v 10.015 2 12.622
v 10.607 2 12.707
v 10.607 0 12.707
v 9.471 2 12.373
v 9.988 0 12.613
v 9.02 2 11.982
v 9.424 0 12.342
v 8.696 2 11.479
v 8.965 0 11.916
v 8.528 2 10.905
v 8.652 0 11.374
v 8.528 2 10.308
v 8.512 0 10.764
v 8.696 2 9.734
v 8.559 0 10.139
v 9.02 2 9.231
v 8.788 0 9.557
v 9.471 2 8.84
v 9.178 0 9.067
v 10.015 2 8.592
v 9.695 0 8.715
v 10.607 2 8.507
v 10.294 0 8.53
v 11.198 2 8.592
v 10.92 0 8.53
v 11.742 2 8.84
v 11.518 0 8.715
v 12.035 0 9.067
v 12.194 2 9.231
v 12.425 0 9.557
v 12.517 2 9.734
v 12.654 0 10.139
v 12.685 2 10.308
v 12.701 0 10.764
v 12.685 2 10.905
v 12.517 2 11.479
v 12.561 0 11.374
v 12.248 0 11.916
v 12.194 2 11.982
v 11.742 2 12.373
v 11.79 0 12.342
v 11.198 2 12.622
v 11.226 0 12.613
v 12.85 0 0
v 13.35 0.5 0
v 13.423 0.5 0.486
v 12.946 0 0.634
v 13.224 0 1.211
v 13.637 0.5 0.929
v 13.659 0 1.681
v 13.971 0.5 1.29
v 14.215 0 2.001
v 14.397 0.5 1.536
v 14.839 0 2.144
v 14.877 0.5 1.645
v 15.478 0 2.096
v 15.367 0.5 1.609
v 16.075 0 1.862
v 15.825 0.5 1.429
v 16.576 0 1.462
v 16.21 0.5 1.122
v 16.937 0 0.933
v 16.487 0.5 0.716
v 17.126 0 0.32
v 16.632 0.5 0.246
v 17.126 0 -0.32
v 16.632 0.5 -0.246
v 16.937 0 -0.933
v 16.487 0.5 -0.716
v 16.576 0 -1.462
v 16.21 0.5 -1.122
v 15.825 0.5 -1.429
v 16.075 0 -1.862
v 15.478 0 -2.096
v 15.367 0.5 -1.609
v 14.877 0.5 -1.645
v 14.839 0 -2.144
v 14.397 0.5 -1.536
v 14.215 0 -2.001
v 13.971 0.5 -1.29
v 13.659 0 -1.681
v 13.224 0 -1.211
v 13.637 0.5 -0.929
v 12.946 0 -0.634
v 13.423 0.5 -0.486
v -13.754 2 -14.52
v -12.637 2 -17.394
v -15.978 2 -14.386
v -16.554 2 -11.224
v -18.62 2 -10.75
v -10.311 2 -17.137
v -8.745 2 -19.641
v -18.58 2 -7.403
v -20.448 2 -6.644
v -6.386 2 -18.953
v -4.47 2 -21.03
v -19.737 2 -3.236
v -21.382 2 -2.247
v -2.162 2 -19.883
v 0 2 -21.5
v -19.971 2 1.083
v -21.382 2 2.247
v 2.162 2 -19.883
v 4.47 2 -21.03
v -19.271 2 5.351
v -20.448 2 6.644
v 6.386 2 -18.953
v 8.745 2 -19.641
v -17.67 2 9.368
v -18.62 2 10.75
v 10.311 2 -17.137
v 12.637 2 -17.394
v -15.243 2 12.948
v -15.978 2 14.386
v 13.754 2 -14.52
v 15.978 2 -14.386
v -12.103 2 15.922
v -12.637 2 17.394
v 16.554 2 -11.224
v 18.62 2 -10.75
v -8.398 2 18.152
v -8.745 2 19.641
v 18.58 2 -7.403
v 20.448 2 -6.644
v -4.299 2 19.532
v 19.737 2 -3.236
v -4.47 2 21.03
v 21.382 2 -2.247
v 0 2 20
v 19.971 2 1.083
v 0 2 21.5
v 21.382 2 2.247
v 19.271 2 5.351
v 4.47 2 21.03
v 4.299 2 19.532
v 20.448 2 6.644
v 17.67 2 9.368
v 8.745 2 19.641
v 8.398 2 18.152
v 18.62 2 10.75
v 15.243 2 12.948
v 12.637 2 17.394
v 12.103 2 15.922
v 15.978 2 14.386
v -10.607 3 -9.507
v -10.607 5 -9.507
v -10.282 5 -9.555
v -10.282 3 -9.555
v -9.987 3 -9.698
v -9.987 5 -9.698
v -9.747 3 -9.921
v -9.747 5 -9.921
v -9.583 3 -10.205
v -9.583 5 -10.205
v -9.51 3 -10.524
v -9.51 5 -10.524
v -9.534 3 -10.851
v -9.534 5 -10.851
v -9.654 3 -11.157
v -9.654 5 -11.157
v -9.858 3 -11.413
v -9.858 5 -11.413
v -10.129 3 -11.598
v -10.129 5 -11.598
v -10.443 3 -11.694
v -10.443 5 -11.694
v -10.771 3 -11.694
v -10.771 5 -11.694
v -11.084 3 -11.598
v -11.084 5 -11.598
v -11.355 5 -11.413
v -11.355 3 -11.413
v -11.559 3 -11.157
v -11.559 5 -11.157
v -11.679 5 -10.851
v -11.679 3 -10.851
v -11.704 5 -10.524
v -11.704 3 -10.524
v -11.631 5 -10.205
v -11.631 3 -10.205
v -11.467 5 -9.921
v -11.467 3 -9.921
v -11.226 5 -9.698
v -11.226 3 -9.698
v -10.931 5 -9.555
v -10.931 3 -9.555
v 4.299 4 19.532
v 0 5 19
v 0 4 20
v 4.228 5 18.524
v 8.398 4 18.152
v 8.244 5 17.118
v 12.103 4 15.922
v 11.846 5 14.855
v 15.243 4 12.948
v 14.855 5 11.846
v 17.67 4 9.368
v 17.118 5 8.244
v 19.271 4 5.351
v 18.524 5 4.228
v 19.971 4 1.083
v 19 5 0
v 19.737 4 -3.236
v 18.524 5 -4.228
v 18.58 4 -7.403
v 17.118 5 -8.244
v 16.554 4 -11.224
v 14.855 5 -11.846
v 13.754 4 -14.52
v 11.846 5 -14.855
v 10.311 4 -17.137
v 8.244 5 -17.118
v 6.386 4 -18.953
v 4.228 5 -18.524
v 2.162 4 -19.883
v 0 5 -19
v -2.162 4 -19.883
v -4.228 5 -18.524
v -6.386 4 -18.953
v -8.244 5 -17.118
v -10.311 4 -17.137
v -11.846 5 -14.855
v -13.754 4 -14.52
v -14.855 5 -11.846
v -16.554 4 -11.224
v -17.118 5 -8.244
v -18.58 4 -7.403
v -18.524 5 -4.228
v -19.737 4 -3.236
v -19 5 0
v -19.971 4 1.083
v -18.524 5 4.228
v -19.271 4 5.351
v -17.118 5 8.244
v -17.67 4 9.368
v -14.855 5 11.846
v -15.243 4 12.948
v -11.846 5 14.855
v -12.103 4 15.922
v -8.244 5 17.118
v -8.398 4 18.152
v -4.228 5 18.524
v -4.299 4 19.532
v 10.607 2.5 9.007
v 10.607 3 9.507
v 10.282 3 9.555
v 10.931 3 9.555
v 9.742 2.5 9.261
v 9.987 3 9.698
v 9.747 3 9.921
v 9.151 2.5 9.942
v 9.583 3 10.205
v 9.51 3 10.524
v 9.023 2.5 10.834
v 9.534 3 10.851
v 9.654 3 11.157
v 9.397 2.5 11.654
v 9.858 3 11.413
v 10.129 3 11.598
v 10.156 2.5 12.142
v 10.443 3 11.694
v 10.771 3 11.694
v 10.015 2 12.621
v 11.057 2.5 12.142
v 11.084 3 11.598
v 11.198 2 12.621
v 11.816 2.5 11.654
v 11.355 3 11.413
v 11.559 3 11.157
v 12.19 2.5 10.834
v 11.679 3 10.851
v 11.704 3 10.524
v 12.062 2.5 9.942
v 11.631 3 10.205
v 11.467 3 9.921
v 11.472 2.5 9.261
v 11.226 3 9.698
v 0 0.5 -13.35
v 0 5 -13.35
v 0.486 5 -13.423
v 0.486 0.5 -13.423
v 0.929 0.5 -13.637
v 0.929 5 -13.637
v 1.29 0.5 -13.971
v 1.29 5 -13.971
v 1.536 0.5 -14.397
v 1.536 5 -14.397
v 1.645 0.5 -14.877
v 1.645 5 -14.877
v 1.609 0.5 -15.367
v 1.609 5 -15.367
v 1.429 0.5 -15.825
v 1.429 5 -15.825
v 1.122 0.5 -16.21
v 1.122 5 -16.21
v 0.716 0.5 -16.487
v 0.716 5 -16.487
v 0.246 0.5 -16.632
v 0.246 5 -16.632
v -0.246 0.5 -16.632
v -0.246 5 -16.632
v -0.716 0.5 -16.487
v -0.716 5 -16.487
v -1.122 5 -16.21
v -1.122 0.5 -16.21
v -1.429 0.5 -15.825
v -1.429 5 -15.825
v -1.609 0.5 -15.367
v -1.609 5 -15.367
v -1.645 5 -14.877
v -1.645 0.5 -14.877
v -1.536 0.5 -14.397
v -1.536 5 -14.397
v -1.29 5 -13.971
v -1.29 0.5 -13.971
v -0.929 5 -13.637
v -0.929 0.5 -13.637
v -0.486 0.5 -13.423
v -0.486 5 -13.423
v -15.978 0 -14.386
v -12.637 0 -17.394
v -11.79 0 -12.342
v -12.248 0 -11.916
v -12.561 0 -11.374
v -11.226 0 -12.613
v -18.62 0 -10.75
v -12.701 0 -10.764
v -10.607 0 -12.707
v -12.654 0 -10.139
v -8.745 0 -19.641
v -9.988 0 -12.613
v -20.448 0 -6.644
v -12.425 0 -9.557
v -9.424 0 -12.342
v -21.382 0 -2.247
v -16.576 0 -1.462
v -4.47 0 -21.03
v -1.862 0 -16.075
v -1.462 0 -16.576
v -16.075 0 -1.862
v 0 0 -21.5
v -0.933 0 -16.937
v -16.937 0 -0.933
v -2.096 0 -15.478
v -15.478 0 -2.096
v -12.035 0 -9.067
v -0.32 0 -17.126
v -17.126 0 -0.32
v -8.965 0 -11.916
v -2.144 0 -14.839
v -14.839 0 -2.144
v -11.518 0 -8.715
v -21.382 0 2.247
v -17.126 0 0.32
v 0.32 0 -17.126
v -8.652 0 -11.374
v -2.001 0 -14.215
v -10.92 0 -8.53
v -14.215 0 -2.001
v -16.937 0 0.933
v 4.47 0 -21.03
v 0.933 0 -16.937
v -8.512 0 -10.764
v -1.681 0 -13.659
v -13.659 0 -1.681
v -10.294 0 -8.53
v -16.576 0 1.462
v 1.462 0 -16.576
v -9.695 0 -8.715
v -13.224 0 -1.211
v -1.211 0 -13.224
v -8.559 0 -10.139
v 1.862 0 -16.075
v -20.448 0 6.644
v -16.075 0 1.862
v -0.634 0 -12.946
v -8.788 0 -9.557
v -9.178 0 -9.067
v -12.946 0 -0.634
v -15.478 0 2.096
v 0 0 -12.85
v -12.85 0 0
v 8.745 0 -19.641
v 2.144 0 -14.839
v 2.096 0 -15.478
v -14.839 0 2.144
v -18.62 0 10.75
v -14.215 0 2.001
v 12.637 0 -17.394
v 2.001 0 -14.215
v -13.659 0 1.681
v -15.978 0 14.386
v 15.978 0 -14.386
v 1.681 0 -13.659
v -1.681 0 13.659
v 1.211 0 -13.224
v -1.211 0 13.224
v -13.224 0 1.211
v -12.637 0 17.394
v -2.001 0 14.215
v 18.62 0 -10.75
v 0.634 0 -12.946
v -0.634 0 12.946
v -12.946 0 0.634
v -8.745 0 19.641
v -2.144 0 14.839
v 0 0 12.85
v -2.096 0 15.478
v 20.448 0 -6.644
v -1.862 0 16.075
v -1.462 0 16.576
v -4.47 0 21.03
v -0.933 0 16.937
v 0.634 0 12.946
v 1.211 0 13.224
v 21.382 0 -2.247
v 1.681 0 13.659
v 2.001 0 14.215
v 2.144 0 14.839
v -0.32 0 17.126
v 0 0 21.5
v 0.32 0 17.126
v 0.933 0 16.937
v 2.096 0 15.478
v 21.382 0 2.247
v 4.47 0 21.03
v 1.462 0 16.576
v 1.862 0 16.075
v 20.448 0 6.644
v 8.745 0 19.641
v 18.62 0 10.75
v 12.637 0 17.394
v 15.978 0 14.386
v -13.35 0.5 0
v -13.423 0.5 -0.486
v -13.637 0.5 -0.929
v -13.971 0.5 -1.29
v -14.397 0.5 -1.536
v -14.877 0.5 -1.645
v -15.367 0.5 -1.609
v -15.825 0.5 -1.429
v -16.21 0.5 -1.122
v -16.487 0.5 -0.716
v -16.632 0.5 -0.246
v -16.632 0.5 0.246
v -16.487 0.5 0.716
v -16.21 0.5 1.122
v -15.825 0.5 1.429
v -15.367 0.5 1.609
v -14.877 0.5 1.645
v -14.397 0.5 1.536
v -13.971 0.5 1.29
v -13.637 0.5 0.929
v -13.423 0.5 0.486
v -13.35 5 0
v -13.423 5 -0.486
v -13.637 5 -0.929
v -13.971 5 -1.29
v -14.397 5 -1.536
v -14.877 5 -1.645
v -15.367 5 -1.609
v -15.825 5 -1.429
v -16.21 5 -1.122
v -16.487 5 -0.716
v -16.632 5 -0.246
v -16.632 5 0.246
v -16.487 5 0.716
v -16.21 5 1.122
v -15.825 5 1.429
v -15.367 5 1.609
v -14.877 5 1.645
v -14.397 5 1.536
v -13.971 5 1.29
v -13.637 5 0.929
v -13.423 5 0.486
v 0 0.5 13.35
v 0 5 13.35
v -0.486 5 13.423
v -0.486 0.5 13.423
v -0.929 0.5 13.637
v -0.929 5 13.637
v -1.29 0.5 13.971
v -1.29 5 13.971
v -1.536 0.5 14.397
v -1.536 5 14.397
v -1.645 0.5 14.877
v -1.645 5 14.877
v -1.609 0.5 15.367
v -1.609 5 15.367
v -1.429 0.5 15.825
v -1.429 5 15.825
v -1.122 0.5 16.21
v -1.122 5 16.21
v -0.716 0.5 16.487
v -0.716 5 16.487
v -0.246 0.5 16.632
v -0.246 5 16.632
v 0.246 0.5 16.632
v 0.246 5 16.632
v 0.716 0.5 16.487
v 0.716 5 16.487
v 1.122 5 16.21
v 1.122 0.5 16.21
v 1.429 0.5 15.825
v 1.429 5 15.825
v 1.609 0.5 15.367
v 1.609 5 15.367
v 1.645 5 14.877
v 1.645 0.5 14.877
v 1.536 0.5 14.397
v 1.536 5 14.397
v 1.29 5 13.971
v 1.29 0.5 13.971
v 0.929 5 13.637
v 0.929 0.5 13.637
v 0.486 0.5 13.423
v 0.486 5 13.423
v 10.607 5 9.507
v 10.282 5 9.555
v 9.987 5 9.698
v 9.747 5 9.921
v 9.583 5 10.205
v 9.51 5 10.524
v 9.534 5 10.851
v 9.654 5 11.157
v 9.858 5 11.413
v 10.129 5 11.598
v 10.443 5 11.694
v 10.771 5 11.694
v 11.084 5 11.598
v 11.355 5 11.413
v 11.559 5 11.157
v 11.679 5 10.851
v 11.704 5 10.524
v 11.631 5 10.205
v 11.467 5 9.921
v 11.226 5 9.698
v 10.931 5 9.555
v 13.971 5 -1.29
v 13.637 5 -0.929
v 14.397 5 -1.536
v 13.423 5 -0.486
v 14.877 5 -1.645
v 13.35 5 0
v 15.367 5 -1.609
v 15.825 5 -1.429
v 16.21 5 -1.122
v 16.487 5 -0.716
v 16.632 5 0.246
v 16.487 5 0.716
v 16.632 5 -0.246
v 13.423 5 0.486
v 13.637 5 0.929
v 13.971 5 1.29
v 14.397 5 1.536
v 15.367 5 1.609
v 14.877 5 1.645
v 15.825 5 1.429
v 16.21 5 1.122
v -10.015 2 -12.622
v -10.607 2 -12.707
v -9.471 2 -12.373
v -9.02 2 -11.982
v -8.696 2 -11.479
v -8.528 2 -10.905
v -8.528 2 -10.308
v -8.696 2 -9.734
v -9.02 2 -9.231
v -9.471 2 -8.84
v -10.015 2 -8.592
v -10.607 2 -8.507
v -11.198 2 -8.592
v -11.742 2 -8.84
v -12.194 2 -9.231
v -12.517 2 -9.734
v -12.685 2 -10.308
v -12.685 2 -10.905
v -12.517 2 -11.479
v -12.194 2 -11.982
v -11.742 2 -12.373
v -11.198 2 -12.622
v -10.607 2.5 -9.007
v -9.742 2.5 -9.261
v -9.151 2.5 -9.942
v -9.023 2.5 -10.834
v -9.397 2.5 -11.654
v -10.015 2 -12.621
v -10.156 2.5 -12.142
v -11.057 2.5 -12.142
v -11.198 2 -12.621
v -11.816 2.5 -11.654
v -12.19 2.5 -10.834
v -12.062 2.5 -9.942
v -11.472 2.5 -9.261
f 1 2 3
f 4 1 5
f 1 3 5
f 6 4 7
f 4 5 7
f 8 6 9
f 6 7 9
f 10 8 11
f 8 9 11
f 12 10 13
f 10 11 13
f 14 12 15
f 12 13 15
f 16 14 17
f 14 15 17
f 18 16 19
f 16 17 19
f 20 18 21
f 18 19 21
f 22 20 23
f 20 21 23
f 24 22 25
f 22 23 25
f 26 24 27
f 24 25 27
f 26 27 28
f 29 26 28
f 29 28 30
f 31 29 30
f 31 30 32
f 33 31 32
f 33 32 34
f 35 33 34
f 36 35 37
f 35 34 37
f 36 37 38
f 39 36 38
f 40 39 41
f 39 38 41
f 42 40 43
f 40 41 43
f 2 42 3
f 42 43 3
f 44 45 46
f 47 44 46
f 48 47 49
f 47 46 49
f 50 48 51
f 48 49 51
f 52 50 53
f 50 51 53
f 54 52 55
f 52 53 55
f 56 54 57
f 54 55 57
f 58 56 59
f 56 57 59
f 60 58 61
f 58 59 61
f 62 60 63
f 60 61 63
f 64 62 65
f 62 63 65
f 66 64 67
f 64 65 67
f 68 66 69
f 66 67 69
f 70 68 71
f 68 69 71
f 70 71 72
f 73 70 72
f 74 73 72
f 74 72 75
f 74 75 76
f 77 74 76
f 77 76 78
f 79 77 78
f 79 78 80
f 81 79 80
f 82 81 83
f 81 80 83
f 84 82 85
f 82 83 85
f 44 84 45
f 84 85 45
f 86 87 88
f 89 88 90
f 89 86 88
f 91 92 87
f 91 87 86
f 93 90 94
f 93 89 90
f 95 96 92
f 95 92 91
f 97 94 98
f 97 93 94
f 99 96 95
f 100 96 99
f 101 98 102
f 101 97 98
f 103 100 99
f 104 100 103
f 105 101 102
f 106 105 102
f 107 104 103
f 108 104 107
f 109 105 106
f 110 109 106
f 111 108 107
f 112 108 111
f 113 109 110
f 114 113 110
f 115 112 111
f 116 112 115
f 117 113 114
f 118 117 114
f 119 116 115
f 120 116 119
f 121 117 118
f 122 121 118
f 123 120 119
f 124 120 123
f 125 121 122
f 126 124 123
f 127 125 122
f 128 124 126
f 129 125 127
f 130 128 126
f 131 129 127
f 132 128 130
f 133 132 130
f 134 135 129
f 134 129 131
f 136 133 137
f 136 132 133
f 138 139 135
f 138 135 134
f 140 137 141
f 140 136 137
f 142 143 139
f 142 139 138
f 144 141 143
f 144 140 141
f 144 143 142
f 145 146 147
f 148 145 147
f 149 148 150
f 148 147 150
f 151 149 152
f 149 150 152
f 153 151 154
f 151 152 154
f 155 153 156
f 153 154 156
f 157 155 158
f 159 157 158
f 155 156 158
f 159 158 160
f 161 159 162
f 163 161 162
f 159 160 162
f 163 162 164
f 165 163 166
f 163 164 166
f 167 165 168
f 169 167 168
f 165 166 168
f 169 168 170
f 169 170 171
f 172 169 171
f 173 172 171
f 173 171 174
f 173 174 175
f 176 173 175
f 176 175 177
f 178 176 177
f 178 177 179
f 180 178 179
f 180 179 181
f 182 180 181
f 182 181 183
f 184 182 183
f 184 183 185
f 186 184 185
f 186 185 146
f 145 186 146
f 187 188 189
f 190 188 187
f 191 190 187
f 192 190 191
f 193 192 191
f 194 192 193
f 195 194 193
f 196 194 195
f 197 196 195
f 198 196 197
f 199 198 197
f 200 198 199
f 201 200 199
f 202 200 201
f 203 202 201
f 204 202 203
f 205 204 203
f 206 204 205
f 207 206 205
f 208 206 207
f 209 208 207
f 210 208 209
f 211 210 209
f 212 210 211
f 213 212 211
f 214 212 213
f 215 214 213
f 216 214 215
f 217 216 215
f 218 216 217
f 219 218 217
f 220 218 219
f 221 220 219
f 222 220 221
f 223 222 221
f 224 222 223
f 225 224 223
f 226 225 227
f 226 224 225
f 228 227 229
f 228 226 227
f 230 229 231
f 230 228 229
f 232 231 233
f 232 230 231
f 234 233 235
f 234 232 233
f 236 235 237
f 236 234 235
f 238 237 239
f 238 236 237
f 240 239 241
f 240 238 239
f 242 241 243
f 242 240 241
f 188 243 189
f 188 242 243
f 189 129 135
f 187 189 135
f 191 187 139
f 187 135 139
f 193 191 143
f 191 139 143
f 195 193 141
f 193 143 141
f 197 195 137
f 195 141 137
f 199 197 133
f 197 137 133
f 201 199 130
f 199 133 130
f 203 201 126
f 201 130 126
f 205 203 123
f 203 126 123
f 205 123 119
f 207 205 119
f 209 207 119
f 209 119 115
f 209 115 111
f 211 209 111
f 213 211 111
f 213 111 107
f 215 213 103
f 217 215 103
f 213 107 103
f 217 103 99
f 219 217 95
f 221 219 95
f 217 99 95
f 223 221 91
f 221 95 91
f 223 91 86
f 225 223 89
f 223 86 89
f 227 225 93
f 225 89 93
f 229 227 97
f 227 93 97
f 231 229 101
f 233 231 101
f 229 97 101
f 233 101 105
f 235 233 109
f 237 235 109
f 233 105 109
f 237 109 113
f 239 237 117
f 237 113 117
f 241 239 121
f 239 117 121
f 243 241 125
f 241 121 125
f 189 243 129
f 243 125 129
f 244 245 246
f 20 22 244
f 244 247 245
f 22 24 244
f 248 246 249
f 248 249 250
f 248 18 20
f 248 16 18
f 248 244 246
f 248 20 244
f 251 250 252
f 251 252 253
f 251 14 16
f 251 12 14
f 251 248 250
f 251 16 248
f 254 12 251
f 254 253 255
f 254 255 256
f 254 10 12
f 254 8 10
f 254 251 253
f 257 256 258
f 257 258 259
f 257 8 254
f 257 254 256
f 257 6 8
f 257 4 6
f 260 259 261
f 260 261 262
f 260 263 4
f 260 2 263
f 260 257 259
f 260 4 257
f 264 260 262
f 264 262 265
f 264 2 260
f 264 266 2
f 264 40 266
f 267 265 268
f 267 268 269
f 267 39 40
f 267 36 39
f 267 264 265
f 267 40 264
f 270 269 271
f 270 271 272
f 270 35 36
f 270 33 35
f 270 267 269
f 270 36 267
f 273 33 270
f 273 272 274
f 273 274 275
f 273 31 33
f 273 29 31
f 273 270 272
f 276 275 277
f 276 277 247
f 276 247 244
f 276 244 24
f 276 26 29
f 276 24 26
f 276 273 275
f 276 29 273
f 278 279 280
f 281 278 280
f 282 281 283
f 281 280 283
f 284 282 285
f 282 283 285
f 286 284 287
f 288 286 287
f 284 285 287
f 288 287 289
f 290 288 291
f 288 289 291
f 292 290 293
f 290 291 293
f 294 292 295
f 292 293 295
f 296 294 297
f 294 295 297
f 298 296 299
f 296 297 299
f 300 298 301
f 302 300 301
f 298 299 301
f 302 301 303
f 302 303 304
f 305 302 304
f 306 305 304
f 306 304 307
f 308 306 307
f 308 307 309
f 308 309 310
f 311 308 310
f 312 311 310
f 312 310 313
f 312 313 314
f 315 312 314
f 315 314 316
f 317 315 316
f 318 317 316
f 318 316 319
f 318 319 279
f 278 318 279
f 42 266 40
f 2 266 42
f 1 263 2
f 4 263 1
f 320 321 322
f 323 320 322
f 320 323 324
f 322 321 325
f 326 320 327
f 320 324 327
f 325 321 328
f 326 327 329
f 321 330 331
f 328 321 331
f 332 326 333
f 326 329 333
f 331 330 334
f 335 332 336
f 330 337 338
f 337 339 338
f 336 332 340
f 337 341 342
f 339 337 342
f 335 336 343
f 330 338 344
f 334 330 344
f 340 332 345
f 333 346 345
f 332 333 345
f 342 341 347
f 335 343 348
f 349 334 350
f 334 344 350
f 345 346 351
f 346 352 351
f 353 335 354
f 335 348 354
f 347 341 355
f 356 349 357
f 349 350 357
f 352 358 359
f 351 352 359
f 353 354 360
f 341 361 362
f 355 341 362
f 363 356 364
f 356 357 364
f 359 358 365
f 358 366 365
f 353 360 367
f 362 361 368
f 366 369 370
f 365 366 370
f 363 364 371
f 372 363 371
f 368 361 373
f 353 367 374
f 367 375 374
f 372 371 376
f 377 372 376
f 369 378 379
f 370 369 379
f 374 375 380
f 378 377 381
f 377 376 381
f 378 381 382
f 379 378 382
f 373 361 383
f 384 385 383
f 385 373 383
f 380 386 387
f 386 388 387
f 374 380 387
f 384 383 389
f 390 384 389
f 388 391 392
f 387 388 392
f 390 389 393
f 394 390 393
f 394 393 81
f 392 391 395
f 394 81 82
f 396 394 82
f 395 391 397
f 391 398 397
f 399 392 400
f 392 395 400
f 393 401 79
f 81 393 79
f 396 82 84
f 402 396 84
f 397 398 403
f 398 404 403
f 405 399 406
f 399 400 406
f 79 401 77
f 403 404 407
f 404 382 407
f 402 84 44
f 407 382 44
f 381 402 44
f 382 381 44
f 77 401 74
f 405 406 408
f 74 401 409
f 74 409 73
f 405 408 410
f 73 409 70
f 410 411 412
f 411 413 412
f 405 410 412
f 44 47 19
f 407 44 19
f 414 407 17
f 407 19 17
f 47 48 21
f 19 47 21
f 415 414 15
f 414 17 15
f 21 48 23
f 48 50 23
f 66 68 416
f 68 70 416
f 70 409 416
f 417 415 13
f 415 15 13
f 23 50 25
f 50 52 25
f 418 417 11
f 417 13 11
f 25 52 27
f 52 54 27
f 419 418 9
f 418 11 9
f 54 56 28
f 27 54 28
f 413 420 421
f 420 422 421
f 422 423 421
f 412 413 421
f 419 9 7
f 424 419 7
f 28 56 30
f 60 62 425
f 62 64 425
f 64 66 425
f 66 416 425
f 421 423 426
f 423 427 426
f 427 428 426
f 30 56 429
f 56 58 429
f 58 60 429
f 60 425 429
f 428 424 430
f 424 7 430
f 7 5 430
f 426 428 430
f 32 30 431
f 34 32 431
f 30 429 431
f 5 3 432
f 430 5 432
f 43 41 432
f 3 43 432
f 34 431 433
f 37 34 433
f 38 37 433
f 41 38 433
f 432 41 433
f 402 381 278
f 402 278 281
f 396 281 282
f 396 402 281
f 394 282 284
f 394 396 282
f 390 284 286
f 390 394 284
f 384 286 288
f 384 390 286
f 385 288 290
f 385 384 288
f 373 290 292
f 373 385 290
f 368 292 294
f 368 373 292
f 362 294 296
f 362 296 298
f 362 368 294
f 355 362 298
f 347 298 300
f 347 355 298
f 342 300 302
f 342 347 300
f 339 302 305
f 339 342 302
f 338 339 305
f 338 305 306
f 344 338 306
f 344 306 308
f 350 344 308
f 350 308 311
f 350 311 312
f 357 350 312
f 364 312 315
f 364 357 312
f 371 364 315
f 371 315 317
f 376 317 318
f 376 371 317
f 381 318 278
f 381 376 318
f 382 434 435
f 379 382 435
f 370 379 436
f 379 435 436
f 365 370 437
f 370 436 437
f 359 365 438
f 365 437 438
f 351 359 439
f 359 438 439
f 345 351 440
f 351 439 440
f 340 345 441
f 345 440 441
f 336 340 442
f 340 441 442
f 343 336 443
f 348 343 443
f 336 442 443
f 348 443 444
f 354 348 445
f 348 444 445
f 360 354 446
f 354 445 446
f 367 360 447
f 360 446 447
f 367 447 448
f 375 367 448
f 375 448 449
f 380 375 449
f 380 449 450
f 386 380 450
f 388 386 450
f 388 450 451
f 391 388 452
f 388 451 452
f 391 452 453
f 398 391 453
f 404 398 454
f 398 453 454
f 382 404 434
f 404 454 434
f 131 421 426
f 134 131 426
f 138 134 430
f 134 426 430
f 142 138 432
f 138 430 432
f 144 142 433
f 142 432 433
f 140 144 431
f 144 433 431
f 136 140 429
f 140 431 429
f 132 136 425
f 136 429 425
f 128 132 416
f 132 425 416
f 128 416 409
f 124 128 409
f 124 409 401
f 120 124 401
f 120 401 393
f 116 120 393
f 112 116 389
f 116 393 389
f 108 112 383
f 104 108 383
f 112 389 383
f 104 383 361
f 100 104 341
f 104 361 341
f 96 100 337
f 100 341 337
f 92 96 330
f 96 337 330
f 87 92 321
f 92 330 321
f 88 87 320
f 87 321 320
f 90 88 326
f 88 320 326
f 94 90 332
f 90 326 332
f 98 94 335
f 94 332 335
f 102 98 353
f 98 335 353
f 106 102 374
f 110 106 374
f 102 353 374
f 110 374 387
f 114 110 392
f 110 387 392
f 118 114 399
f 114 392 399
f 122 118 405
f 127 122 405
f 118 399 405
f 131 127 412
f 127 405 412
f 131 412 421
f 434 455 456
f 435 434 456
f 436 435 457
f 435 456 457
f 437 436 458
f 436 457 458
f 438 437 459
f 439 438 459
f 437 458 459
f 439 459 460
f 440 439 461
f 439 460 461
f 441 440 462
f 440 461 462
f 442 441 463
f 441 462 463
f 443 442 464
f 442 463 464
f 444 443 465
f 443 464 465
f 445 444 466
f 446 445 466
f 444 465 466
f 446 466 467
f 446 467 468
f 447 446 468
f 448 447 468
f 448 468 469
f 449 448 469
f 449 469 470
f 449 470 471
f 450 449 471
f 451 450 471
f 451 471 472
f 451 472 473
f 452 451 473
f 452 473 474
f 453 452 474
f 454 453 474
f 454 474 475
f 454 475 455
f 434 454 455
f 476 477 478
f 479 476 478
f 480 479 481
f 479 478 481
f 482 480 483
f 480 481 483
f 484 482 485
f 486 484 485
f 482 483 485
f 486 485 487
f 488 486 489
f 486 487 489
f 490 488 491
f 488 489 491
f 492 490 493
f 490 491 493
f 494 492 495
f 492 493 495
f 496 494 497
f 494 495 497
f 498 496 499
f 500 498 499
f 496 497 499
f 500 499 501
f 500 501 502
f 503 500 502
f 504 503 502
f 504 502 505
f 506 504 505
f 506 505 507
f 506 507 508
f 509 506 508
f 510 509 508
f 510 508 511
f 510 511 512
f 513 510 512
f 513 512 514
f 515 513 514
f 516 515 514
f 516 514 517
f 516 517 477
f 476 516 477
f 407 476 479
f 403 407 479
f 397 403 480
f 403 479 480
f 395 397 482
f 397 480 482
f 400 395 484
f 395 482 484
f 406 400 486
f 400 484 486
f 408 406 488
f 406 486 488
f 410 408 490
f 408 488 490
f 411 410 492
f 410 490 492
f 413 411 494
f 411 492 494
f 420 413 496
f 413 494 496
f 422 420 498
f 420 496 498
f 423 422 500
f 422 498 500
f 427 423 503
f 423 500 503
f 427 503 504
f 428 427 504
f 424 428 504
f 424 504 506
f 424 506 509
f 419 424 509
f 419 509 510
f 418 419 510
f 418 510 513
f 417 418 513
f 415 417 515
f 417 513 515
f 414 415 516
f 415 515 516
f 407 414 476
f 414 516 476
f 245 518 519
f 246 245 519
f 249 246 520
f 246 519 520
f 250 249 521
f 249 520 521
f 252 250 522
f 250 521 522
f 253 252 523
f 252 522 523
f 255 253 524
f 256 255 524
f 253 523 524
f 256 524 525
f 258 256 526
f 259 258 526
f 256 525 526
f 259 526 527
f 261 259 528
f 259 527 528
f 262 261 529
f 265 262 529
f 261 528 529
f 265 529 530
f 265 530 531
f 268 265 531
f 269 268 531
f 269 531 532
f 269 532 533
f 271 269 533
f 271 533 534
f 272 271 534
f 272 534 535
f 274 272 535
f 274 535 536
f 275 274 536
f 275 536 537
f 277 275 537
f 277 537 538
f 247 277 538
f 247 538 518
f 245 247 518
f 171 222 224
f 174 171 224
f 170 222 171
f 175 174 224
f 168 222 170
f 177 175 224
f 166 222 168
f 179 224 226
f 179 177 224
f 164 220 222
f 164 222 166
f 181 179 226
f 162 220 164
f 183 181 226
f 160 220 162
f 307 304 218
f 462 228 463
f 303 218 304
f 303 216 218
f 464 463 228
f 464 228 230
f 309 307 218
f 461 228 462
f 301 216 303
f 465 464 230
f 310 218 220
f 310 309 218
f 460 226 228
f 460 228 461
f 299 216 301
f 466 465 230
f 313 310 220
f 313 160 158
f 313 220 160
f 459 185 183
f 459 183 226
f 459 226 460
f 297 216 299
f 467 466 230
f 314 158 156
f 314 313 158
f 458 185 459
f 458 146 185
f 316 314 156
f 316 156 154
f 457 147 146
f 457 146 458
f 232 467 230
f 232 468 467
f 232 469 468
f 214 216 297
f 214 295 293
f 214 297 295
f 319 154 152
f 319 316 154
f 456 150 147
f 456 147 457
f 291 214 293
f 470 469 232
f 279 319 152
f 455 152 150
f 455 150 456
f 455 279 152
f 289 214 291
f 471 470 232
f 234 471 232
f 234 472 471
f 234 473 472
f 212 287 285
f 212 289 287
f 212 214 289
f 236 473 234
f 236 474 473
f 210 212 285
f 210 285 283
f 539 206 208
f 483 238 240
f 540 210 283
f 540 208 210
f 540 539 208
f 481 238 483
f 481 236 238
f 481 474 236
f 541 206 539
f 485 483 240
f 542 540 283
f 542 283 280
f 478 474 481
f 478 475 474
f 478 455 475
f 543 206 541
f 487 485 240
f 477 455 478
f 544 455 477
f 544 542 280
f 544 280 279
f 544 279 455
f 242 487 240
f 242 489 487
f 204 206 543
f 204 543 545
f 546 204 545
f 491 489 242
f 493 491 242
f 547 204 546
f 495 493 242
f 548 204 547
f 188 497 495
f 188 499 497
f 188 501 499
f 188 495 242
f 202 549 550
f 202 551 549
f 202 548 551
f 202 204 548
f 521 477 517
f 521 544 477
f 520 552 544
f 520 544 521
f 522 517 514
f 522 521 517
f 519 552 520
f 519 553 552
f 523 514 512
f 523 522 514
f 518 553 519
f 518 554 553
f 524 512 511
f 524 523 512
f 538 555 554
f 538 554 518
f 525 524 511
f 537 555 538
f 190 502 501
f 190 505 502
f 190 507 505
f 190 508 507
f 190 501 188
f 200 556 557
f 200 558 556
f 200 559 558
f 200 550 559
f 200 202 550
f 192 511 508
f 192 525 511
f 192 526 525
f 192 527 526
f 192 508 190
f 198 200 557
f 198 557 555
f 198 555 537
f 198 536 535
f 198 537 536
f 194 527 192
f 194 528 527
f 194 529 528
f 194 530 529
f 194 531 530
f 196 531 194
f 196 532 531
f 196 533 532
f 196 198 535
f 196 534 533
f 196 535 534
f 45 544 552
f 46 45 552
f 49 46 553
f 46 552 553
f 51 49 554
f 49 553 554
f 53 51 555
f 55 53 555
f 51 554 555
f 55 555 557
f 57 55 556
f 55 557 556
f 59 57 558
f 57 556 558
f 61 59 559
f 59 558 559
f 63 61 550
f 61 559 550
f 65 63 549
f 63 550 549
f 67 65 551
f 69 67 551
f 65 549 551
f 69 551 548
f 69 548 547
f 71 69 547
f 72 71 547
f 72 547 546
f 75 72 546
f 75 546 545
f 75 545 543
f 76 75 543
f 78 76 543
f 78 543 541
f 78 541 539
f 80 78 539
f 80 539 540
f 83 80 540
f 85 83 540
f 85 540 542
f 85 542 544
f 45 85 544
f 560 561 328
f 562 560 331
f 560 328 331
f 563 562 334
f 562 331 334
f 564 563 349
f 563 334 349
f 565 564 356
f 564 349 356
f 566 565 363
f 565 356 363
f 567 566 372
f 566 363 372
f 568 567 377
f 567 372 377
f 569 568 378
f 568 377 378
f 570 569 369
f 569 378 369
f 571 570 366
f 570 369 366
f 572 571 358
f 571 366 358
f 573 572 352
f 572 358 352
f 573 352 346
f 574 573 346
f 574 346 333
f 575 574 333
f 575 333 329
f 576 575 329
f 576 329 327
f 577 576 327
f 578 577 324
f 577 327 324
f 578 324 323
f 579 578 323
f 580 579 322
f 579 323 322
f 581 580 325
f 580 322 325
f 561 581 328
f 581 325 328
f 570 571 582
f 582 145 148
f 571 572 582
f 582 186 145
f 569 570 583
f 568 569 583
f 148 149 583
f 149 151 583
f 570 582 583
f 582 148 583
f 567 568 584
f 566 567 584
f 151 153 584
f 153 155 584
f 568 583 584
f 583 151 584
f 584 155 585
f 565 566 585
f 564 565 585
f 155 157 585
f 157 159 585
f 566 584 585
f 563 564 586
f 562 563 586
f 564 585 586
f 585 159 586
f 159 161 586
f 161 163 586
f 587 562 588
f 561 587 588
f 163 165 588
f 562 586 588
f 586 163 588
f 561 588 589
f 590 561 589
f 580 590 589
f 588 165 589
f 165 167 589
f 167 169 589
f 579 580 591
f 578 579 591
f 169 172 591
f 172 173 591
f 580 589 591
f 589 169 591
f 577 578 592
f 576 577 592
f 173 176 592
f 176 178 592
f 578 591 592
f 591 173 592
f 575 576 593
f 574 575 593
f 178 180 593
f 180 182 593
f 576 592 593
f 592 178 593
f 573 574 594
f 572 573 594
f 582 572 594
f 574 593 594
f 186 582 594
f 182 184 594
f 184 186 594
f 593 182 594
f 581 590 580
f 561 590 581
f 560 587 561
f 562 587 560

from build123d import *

# Parameters (mm, degrees)
SKETCH_1_R                           = 21.5
EXTRUDE_1_DEPTH                      = 2
SKETCH_3_R                           = 20
EXTRUDE_2_DEPTH                      = 3
CHAMFER_1_SIZE                       = 1
SKETCH_4_R                           = 1.65
CUT_EXTRUDE_1_DEPTH                  = 31.813957876
CHAMFER_2_SIZE                       = 0.5
PATTERN_CIRCULAR_1_COUNT             = 4
CHAMFER_2_OF_PATTERN_CIRCULAR_1_SIZE = 0.5
SKETCH_5_R                           = 1.1
CUT_EXTRUDE_2_DEPTH                  = 31.813957876
SKETCH_6_R                           = 2.1
CUT_EXTRUDE_3_DEPTH                  = 2
CHAMFER_3_SIZE                       = 1
PATTERN_CIRCULAR_2_COUNT             = 2
CHAMFER_3_OF_PATTERN_CIRCULAR_2_SIZE = 1


with BuildPart() as part:
    # 草图1 → 凸台-拉伸1 (new body)
    with BuildSketch(Plane(origin=(0, 0, 0), x_dir=(1, 0, 0), z_dir=(0, 1, 0))):
        with Locations(Location((0, 0, 0), (0, 0, 270))):
            Circle(SKETCH_1_R)
    extrude(amount=EXTRUDE_1_DEPTH)

    # 草图3 → 凸台-拉伸2 (add)
    with BuildSketch(Plane(origin=(0, 2, 0), x_dir=(1, 0, 0), z_dir=(0, 1, 0))):
        with Locations(Location((0, 0, 0), (0, 0, 270))):
            Circle(SKETCH_3_R)
    extrude(amount=EXTRUDE_2_DEPTH)

    # 倒角1
    chamfer_1_edges = [part.edges().sort_by_distance(p)[0] for p in [
        (0, 5, -20),
    ]]
    chamfer(chamfer_1_edges, length=CHAMFER_1_SIZE)

    # 草图4 → 切除-拉伸1 (cut, through all)
    with BuildSketch(Plane(origin=(0, 5, 0), x_dir=(1, 0, 0), z_dir=(0, 1, 0))):
        with Locations(Location((0, 15, 0), (0, 0, 270))):
            Circle(SKETCH_4_R)
    cut_extrude_1 = extrude(amount=-CUT_EXTRUDE_1_DEPTH, mode=Mode.SUBTRACT)

    # 倒角2
    chamfer_2_edges = [part.edges().sort_by_distance(p)[0] for p in [
        (0, 0, -16.65),
    ]]
    chamfer(chamfer_2_edges, length=CHAMFER_2_SIZE)

    # 阵列(圆周)1: 切除-拉伸1 ×4 about axis
    pattern_circular_1_axis = Axis((0, 0, 0), (0, 1, 0))
    for i in range(1, PATTERN_CIRCULAR_1_COUNT):
        add(cut_extrude_1.rotate(pattern_circular_1_axis, i * 360 / PATTERN_CIRCULAR_1_COUNT), mode=Mode.SUBTRACT)

    # 倒角2 of 阵列(圆周)1
    chamfer_2_of_pattern_circular_1_edges = [part.edges().sort_by_distance(p)[0] for p in [
        (-16.65, 0, 0),
        (0, 0, 16.65),
        (16.65, 0, 0),
    ]]
    chamfer(chamfer_2_of_pattern_circular_1_edges, length=CHAMFER_2_OF_PATTERN_CIRCULAR_1_SIZE)

    # 草图5 → 切除-拉伸2 (cut, through all)
    with BuildSketch(Plane(origin=(0, 5, 0), x_dir=(1, 0, 0), z_dir=(0, 1, 0))):
        with Locations(Location((-10.606601718, 10.606601718, 0), (0, 0, 270))):
            Circle(SKETCH_5_R)
    cut_extrude_2 = extrude(amount=-CUT_EXTRUDE_2_DEPTH, mode=Mode.SUBTRACT)

    # 草图6 → 切除-拉伸3 (cut)
    with BuildSketch(Plane.XZ):
        with Locations(Location((-10.606601718, -10.606601718, 0), (0, 0, 270))):
            Circle(SKETCH_6_R)
    cut_extrude_3 = extrude(amount=-CUT_EXTRUDE_3_DEPTH, mode=Mode.SUBTRACT)

    # 倒角3
    chamfer_3_edges = [part.edges().sort_by_distance(p)[0] for p in [
        (-10.606601718, 2, -11.706601718),
    ]]
    chamfer(chamfer_3_edges, length=CHAMFER_3_SIZE - 0.0001)  # a hair under: the kernel refuses the full size

    # 阵列(圆周)2: 切除-拉伸2, 切除-拉伸3 ×2 about axis
    pattern_circular_2_axis = Axis((0, 0, 0), (0, 1, 0))
    add([cut_extrude_2.rotate(pattern_circular_2_axis, i * 360 / PATTERN_CIRCULAR_2_COUNT) for i in range(1, PATTERN_CIRCULAR_2_COUNT)], mode=Mode.SUBTRACT)
    add([cut_extrude_3.rotate(pattern_circular_2_axis, i * 360 / PATTERN_CIRCULAR_2_COUNT) for i in range(1, PATTERN_CIRCULAR_2_COUNT)], mode=Mode.SUBTRACT)

    # 倒角3 of 阵列(圆周)2
    chamfer_3_of_pattern_circular_2_edges = [part.edges().sort_by_distance(p)[0] for p in [
        (10.606601718, 2, 11.706601718),
    ]]
    chamfer(chamfer_3_of_pattern_circular_2_edges, length=CHAMFER_3_OF_PATTERN_CIRCULAR_2_SIZE - 0.0001)  # a hair under: the kernel refuses the full size


solid = part.part
